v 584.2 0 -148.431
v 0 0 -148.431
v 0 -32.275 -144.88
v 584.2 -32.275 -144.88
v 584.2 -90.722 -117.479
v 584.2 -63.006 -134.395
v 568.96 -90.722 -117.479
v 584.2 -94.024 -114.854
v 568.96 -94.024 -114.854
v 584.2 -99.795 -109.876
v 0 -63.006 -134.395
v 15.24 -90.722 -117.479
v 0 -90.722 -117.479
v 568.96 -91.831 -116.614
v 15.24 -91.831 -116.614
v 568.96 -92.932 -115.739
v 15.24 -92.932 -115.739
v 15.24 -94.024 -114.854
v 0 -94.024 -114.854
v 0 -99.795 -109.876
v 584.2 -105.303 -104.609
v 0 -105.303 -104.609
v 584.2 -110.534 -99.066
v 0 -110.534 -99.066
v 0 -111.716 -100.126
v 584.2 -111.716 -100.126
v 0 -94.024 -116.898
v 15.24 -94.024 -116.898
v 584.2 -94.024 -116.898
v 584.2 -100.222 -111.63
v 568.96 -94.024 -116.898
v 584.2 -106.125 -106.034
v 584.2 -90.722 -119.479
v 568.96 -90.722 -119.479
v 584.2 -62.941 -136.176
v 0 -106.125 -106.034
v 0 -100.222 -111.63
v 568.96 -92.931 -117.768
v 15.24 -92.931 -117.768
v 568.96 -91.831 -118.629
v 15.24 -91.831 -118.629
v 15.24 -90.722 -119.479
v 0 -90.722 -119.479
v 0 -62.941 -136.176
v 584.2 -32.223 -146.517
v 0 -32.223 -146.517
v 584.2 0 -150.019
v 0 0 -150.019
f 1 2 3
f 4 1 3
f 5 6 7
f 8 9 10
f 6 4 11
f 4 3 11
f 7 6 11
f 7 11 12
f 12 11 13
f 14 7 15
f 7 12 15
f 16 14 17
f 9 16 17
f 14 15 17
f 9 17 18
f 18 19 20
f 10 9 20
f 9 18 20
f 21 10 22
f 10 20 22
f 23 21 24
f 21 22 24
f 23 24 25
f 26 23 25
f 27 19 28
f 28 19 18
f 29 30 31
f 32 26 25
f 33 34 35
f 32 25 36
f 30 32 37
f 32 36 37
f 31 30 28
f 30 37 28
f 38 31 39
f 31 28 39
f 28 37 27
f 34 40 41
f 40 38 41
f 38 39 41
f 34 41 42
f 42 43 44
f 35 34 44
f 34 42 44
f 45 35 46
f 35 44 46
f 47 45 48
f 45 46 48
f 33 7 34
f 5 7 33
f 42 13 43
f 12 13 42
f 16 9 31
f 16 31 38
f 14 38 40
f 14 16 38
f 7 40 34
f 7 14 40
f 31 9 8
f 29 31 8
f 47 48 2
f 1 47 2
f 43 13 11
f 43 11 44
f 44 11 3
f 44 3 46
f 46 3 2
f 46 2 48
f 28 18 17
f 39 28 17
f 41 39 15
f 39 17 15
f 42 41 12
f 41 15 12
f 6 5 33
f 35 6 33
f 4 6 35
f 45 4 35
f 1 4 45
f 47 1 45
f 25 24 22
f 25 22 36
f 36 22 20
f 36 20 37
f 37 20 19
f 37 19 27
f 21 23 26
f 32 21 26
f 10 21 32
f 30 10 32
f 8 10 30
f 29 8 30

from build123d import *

# Parameters (mm, degrees)
EXTRUDE_THIN1_DEPTH = 584.2
SKETCH3_W           = 15.24
SKETCH3_H           = 3.302
CUT_EXTRUDE1_DEPTH  = 614.413196966


with BuildPart() as part:
    # Sketch2 → Extrude-Thin1 (new body)
    with BuildSketch(Plane(origin=(0, 0, 0), x_dir=(0, 0, -1), z_dir=(1, 0, 0))):
        with BuildLine():
            ThreePointArc((100.125623552, -111.716090426), (136.978732363, -61.175585258), (150.01875, 0))
            Line((150.01875, 0), (148.43125, 0))
            ThreePointArc((148.43125, 0), (135.529221968, -60.528224568), (99.066093144, -110.533909574))
            Line((99.066093144, -110.533909574), (100.125623552, -111.716090426))
        make_face()
    extrude(amount=EXTRUDE_THIN1_DEPTH)

    # Sketch3 → Cut-Extrude1 (cut, through all)
    with BuildSketch(Plane.XY):
        with Locations((7.62, -92.372909574)):
            Rectangle(SKETCH3_W, SKETCH3_H)
        with Locations((576.58, -92.372909574)):
            Rectangle(SKETCH3_W, SKETCH3_H)
    extrude(amount=-CUT_EXTRUDE1_DEPTH, mode=Mode.SUBTRACT)


solid = part.part
